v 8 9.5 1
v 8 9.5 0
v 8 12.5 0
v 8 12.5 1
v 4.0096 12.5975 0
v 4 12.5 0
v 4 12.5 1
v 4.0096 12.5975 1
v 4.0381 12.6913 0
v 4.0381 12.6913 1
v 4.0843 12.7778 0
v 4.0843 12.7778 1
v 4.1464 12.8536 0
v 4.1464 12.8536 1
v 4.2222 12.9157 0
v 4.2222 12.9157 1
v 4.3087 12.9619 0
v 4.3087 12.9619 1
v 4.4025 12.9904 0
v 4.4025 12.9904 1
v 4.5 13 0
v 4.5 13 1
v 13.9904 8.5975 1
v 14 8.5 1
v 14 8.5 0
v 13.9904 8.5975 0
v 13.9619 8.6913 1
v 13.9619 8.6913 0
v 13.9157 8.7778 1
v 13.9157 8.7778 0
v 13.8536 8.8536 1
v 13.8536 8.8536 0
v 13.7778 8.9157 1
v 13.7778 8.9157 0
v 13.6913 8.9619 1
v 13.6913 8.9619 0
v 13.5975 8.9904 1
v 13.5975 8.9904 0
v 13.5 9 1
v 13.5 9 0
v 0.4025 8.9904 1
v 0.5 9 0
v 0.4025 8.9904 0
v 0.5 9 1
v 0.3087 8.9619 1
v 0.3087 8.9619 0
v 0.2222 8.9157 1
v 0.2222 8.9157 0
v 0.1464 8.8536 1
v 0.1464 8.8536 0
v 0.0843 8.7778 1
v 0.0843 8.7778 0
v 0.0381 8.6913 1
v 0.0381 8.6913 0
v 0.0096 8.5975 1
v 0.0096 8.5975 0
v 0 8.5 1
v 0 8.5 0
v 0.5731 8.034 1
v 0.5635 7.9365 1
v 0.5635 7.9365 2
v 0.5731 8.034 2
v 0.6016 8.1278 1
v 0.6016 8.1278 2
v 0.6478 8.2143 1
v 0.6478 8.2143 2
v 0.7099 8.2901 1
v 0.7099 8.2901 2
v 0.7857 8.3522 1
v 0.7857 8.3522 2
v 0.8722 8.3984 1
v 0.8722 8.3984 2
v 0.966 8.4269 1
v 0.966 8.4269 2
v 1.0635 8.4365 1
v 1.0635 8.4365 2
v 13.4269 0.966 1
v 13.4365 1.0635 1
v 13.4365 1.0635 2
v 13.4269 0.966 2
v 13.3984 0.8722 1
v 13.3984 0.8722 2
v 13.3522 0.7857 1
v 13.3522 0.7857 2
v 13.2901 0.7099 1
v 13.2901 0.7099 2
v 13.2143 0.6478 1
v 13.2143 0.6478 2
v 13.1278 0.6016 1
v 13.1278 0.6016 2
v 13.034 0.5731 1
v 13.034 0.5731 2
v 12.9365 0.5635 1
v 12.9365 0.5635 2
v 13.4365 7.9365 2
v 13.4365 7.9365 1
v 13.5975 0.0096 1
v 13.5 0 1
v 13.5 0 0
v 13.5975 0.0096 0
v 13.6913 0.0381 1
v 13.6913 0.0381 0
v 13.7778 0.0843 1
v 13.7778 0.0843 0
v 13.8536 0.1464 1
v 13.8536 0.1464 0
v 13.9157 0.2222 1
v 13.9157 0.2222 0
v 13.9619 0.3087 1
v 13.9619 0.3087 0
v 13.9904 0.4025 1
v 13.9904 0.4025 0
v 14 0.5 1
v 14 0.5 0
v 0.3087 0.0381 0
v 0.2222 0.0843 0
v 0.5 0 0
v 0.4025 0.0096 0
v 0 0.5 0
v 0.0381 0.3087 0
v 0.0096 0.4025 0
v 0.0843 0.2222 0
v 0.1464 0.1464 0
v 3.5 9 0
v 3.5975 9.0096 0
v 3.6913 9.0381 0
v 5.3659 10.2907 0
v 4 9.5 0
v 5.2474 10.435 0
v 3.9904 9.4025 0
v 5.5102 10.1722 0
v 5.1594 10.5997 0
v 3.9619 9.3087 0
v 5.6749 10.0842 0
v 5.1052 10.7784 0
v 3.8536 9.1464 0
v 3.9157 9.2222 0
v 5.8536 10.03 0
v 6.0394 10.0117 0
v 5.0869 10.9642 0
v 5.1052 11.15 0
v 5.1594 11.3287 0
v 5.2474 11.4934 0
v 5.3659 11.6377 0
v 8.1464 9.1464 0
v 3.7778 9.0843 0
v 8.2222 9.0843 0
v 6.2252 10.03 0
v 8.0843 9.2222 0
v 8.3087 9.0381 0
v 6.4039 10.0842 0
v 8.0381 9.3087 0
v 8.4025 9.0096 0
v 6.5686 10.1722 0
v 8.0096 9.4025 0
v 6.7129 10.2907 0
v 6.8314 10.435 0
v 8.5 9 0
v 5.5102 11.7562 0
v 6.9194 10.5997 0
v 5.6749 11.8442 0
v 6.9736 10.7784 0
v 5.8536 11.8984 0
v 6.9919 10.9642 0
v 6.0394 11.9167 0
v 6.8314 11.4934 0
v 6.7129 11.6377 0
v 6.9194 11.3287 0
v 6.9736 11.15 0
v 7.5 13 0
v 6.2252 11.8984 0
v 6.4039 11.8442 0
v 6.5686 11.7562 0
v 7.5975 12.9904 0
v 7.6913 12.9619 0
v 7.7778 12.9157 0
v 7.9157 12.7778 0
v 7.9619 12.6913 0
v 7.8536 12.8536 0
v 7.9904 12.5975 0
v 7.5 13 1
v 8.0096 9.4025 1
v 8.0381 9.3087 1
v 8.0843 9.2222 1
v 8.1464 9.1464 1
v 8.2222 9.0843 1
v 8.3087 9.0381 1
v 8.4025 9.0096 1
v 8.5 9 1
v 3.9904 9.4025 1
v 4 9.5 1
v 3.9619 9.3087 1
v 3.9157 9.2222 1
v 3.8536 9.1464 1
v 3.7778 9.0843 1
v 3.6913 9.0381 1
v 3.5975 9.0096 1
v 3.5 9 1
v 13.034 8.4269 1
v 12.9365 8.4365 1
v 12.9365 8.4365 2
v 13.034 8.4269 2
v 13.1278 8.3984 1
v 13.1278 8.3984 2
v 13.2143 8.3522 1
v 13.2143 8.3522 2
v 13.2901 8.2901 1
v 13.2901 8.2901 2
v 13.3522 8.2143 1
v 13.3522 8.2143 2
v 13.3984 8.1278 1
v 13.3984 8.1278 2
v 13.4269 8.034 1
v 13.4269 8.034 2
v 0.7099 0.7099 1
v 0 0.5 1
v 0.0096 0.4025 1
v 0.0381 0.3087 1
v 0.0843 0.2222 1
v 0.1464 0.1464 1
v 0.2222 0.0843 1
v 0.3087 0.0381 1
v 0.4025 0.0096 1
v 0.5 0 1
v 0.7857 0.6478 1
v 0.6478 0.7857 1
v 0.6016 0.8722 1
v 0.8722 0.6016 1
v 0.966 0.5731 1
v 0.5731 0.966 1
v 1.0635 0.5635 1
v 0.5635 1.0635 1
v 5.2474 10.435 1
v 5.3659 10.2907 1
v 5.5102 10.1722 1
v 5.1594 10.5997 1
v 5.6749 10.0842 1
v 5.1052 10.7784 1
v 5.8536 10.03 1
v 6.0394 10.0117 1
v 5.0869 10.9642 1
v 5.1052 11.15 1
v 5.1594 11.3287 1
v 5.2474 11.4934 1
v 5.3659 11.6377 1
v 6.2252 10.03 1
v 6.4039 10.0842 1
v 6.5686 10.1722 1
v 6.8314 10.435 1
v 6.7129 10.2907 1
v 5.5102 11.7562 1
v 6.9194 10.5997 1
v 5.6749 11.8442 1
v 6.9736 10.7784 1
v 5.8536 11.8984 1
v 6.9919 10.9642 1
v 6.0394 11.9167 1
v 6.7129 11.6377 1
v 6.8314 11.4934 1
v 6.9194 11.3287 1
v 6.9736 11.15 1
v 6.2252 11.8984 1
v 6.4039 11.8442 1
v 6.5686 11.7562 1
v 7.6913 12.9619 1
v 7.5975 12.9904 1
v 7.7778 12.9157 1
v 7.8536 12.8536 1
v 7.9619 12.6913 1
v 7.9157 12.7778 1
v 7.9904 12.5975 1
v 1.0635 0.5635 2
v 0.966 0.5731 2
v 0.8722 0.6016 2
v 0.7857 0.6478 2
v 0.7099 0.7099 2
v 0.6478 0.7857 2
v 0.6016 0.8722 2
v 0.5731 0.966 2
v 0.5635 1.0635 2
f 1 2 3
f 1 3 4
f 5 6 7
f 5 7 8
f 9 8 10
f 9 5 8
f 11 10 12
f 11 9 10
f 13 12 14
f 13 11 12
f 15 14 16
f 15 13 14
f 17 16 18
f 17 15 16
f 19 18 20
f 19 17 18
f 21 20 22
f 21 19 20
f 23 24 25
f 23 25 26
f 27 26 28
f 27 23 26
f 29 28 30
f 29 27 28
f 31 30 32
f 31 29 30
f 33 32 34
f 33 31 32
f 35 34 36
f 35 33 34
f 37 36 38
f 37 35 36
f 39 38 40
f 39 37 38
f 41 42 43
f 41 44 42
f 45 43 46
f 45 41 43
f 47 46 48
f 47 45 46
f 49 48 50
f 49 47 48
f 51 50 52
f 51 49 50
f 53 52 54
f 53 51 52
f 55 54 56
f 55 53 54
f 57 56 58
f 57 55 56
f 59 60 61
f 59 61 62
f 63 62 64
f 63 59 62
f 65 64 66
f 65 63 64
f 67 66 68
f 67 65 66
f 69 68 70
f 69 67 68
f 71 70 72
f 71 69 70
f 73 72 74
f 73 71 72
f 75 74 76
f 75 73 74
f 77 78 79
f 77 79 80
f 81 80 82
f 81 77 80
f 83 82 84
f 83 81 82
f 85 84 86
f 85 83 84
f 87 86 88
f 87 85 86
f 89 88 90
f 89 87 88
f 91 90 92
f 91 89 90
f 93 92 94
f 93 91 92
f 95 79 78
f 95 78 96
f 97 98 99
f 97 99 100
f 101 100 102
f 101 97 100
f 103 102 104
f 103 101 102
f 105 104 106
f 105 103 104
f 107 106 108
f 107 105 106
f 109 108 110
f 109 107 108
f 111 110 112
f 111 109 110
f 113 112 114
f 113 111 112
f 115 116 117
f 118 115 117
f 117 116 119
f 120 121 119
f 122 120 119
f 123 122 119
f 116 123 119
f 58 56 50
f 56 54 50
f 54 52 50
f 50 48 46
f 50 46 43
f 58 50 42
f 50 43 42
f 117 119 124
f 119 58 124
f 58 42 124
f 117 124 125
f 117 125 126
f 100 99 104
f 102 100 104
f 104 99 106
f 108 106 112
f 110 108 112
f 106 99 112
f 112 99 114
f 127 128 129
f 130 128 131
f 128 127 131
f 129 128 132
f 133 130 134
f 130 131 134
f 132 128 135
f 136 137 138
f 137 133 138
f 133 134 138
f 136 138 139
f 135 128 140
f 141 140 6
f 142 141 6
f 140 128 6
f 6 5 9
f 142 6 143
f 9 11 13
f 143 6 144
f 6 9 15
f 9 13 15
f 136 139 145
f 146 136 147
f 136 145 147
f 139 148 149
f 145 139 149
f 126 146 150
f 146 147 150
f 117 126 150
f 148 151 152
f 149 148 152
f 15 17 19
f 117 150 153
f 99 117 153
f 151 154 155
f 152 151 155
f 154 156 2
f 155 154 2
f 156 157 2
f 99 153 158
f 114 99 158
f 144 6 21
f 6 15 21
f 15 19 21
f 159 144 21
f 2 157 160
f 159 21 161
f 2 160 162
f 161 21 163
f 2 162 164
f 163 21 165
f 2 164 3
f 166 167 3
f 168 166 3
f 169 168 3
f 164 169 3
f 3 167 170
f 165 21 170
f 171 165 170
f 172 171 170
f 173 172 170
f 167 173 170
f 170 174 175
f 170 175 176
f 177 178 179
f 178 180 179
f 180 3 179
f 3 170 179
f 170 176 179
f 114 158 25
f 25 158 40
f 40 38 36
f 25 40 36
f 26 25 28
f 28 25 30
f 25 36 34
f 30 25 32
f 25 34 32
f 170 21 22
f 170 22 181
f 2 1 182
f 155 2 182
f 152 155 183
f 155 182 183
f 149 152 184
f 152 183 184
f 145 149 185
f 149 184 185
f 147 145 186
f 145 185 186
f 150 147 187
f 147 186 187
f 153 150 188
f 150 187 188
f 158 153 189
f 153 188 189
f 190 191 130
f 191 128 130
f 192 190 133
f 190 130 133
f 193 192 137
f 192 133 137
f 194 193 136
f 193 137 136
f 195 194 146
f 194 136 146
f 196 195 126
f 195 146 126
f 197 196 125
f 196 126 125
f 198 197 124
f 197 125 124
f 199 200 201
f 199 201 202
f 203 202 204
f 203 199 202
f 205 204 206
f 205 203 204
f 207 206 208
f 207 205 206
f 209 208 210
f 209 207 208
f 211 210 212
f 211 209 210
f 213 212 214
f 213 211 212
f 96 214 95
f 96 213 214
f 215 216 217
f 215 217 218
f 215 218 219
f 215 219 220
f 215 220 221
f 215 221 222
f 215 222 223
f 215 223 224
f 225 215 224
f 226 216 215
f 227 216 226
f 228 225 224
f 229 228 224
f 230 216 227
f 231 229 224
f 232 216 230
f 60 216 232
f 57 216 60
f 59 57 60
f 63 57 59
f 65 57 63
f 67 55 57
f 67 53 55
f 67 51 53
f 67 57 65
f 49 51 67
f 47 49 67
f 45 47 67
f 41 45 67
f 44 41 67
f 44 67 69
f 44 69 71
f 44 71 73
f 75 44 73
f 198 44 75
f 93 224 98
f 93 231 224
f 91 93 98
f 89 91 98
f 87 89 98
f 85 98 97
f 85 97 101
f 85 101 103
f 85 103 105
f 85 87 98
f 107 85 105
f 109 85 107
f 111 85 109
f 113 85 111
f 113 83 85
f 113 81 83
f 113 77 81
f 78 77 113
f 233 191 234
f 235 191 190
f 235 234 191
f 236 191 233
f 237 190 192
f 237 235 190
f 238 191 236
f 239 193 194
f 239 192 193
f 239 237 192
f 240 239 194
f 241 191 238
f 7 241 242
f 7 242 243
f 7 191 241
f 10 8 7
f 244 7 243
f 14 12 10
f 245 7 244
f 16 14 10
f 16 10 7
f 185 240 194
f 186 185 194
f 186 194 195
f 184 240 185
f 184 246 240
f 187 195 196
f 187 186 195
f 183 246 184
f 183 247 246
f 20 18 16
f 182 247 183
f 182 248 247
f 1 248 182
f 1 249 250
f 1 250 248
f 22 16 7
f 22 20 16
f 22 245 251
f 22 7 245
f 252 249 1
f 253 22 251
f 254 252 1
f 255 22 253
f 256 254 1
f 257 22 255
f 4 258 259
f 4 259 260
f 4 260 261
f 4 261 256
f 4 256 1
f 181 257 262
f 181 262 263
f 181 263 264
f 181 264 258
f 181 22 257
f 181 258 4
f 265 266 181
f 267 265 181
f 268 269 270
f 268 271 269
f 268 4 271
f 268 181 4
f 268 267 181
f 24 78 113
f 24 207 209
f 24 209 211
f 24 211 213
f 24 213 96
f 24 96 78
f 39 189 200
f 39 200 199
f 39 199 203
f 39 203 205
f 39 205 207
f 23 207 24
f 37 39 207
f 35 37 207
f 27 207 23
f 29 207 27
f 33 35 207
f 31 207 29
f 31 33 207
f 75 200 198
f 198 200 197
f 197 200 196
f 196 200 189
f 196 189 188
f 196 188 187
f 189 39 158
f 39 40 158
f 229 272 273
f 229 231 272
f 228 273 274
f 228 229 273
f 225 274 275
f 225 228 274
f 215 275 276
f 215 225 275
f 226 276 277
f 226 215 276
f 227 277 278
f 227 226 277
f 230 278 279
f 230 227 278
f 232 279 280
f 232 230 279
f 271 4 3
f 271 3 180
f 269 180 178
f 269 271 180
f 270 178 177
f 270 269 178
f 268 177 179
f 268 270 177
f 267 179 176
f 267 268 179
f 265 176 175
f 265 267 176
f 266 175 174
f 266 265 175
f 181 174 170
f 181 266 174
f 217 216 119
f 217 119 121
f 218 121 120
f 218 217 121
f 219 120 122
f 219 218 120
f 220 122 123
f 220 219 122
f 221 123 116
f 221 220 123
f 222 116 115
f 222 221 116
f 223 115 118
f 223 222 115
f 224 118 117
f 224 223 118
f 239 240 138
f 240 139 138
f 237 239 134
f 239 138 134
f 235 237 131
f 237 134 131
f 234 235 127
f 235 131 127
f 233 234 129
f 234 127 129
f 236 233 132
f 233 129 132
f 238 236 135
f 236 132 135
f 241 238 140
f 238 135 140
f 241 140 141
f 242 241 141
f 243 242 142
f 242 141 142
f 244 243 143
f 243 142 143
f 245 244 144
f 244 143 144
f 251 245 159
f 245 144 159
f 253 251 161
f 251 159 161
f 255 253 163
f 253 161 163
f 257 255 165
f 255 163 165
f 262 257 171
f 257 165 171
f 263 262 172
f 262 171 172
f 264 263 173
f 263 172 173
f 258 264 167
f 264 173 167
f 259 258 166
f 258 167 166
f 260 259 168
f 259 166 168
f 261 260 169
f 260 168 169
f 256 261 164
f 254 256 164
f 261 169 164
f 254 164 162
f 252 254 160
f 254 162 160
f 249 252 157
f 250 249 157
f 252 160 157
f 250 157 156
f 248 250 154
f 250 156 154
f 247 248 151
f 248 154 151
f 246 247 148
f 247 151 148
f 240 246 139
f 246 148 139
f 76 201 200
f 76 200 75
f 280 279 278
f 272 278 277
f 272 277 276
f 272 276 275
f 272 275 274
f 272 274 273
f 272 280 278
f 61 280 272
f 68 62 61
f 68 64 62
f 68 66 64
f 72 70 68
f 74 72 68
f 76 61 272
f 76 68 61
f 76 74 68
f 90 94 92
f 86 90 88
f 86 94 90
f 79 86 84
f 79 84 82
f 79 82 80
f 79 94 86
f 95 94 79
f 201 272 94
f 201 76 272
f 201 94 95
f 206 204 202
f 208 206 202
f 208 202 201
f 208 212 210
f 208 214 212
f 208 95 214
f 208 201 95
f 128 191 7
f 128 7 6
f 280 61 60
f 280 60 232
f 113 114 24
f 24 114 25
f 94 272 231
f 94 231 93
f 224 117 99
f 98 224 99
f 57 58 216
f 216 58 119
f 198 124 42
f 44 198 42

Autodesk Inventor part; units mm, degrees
ref_plane "YZ Plane" through (0, 0, 0) normal (1, 0, 0) x (0, 1, 0)
ref_plane "XZ Plane" through (0, 0, 0) normal (0, 1, 0) x (-1, 0, 0)
ref_plane "XY Plane" through (0, 0, 0) normal (0, 0, 1) x (1, 0, 0)
sketch "Sketch1" plane through (0, 0, 0) normal (0, 0, 1) x (1, 0, 0)
  line L0 (0, 0) -> (14, 0)
  line L1 (14, 0) -> (14, 9)
  line L2 (14, 9) -> (0, 9)
  line L3 (0, 9) -> (0, 0)
  dimension "d0" = 14
  dimension "d1" = 9
extrude "Extrusion1" add sketch "Sketch1" along normal blind 2
sketch "Sketch2" plane through (0, 0, 2) normal (0, 0, 1) x (1, 0, 0)
  line L0 (0, 0) -> (0, 9) projected
  line L1 (14, 0) -> (0, 0) projected
  line L2 (14, 9) -> (14, 0) projected
  line L3 (0, 9) -> (14, 9) projected
  line L4 (0.5635, 8.4365) -> (0.5635, 0.5635)
  line L5 (0.5635, 0.5635) -> (13.4365, 0.5635)
  line L6 (13.4365, 0.5635) -> (13.4365, 8.4365)
  line L7 (13.4365, 8.4365) -> (0.5635, 8.4365)
  dimension "d4" = 0.5635
extrude "Extrusion2" cut sketch "Sketch2" against normal blind 1
sketch "Sketch3" plane through (0, 9, 0) normal (0, 1, 0) x (1, 0, 0)
  line L0 (0, -1) -> (14, -1) projected
  line L1 (14, 0) -> (0, 0) projected
  line L2 (0, 0) -> (0, -1) projected
  line L3 (4, 0) -> (8, 0)
  line L4 (8, 0) -> (8, -1)
  line L5 (8, -1) -> (4, -1)
  line L6 (4, -1) -> (4, 0)
  dimension "d7" = 4
  dimension "d8" = 4
extrude "Extrusion3" add sketch "Sketch3" along normal blind 4 contours L6 L1 L4 L0
sketch "Sketch4" plane through (0, 0, 1) normal (0, 0, 1) x (1, 0, 0)
  line L0 (8, 13) -> (4, 13) projected
  line L1 (4, 9) -> (4, 13) projected
  line L2 (0, 0) -> (0, 9) projected
  line L3 (4, 11) -> (8.8648, 11) construction
  line L4 (6, 13) -> (6, 6.8956) construction
  point P0 (6.0394, 10.9642)
hole "Hole1" at (6.0394, 10.9642, 1) direction (0, 0, -1) diameter 1.905 end through all
fillet "Fillet1" radius 0.5 12 edges at (0.5635, 0.5635, 1.5) (0, 0, 0.5) (0.5635, 8.4365, 1.5) (0, 9, 0.5) (13.4365, 0.5635, 1.5) (14, 0, 0.5) (13.4365, 8.4365, 1.5) (14, 9, 0.5) (8, 9, 0.5) (4, 9, 0.5) (4, 13, 0.5) (8, 13, 0.5)
properties part number "lid"
